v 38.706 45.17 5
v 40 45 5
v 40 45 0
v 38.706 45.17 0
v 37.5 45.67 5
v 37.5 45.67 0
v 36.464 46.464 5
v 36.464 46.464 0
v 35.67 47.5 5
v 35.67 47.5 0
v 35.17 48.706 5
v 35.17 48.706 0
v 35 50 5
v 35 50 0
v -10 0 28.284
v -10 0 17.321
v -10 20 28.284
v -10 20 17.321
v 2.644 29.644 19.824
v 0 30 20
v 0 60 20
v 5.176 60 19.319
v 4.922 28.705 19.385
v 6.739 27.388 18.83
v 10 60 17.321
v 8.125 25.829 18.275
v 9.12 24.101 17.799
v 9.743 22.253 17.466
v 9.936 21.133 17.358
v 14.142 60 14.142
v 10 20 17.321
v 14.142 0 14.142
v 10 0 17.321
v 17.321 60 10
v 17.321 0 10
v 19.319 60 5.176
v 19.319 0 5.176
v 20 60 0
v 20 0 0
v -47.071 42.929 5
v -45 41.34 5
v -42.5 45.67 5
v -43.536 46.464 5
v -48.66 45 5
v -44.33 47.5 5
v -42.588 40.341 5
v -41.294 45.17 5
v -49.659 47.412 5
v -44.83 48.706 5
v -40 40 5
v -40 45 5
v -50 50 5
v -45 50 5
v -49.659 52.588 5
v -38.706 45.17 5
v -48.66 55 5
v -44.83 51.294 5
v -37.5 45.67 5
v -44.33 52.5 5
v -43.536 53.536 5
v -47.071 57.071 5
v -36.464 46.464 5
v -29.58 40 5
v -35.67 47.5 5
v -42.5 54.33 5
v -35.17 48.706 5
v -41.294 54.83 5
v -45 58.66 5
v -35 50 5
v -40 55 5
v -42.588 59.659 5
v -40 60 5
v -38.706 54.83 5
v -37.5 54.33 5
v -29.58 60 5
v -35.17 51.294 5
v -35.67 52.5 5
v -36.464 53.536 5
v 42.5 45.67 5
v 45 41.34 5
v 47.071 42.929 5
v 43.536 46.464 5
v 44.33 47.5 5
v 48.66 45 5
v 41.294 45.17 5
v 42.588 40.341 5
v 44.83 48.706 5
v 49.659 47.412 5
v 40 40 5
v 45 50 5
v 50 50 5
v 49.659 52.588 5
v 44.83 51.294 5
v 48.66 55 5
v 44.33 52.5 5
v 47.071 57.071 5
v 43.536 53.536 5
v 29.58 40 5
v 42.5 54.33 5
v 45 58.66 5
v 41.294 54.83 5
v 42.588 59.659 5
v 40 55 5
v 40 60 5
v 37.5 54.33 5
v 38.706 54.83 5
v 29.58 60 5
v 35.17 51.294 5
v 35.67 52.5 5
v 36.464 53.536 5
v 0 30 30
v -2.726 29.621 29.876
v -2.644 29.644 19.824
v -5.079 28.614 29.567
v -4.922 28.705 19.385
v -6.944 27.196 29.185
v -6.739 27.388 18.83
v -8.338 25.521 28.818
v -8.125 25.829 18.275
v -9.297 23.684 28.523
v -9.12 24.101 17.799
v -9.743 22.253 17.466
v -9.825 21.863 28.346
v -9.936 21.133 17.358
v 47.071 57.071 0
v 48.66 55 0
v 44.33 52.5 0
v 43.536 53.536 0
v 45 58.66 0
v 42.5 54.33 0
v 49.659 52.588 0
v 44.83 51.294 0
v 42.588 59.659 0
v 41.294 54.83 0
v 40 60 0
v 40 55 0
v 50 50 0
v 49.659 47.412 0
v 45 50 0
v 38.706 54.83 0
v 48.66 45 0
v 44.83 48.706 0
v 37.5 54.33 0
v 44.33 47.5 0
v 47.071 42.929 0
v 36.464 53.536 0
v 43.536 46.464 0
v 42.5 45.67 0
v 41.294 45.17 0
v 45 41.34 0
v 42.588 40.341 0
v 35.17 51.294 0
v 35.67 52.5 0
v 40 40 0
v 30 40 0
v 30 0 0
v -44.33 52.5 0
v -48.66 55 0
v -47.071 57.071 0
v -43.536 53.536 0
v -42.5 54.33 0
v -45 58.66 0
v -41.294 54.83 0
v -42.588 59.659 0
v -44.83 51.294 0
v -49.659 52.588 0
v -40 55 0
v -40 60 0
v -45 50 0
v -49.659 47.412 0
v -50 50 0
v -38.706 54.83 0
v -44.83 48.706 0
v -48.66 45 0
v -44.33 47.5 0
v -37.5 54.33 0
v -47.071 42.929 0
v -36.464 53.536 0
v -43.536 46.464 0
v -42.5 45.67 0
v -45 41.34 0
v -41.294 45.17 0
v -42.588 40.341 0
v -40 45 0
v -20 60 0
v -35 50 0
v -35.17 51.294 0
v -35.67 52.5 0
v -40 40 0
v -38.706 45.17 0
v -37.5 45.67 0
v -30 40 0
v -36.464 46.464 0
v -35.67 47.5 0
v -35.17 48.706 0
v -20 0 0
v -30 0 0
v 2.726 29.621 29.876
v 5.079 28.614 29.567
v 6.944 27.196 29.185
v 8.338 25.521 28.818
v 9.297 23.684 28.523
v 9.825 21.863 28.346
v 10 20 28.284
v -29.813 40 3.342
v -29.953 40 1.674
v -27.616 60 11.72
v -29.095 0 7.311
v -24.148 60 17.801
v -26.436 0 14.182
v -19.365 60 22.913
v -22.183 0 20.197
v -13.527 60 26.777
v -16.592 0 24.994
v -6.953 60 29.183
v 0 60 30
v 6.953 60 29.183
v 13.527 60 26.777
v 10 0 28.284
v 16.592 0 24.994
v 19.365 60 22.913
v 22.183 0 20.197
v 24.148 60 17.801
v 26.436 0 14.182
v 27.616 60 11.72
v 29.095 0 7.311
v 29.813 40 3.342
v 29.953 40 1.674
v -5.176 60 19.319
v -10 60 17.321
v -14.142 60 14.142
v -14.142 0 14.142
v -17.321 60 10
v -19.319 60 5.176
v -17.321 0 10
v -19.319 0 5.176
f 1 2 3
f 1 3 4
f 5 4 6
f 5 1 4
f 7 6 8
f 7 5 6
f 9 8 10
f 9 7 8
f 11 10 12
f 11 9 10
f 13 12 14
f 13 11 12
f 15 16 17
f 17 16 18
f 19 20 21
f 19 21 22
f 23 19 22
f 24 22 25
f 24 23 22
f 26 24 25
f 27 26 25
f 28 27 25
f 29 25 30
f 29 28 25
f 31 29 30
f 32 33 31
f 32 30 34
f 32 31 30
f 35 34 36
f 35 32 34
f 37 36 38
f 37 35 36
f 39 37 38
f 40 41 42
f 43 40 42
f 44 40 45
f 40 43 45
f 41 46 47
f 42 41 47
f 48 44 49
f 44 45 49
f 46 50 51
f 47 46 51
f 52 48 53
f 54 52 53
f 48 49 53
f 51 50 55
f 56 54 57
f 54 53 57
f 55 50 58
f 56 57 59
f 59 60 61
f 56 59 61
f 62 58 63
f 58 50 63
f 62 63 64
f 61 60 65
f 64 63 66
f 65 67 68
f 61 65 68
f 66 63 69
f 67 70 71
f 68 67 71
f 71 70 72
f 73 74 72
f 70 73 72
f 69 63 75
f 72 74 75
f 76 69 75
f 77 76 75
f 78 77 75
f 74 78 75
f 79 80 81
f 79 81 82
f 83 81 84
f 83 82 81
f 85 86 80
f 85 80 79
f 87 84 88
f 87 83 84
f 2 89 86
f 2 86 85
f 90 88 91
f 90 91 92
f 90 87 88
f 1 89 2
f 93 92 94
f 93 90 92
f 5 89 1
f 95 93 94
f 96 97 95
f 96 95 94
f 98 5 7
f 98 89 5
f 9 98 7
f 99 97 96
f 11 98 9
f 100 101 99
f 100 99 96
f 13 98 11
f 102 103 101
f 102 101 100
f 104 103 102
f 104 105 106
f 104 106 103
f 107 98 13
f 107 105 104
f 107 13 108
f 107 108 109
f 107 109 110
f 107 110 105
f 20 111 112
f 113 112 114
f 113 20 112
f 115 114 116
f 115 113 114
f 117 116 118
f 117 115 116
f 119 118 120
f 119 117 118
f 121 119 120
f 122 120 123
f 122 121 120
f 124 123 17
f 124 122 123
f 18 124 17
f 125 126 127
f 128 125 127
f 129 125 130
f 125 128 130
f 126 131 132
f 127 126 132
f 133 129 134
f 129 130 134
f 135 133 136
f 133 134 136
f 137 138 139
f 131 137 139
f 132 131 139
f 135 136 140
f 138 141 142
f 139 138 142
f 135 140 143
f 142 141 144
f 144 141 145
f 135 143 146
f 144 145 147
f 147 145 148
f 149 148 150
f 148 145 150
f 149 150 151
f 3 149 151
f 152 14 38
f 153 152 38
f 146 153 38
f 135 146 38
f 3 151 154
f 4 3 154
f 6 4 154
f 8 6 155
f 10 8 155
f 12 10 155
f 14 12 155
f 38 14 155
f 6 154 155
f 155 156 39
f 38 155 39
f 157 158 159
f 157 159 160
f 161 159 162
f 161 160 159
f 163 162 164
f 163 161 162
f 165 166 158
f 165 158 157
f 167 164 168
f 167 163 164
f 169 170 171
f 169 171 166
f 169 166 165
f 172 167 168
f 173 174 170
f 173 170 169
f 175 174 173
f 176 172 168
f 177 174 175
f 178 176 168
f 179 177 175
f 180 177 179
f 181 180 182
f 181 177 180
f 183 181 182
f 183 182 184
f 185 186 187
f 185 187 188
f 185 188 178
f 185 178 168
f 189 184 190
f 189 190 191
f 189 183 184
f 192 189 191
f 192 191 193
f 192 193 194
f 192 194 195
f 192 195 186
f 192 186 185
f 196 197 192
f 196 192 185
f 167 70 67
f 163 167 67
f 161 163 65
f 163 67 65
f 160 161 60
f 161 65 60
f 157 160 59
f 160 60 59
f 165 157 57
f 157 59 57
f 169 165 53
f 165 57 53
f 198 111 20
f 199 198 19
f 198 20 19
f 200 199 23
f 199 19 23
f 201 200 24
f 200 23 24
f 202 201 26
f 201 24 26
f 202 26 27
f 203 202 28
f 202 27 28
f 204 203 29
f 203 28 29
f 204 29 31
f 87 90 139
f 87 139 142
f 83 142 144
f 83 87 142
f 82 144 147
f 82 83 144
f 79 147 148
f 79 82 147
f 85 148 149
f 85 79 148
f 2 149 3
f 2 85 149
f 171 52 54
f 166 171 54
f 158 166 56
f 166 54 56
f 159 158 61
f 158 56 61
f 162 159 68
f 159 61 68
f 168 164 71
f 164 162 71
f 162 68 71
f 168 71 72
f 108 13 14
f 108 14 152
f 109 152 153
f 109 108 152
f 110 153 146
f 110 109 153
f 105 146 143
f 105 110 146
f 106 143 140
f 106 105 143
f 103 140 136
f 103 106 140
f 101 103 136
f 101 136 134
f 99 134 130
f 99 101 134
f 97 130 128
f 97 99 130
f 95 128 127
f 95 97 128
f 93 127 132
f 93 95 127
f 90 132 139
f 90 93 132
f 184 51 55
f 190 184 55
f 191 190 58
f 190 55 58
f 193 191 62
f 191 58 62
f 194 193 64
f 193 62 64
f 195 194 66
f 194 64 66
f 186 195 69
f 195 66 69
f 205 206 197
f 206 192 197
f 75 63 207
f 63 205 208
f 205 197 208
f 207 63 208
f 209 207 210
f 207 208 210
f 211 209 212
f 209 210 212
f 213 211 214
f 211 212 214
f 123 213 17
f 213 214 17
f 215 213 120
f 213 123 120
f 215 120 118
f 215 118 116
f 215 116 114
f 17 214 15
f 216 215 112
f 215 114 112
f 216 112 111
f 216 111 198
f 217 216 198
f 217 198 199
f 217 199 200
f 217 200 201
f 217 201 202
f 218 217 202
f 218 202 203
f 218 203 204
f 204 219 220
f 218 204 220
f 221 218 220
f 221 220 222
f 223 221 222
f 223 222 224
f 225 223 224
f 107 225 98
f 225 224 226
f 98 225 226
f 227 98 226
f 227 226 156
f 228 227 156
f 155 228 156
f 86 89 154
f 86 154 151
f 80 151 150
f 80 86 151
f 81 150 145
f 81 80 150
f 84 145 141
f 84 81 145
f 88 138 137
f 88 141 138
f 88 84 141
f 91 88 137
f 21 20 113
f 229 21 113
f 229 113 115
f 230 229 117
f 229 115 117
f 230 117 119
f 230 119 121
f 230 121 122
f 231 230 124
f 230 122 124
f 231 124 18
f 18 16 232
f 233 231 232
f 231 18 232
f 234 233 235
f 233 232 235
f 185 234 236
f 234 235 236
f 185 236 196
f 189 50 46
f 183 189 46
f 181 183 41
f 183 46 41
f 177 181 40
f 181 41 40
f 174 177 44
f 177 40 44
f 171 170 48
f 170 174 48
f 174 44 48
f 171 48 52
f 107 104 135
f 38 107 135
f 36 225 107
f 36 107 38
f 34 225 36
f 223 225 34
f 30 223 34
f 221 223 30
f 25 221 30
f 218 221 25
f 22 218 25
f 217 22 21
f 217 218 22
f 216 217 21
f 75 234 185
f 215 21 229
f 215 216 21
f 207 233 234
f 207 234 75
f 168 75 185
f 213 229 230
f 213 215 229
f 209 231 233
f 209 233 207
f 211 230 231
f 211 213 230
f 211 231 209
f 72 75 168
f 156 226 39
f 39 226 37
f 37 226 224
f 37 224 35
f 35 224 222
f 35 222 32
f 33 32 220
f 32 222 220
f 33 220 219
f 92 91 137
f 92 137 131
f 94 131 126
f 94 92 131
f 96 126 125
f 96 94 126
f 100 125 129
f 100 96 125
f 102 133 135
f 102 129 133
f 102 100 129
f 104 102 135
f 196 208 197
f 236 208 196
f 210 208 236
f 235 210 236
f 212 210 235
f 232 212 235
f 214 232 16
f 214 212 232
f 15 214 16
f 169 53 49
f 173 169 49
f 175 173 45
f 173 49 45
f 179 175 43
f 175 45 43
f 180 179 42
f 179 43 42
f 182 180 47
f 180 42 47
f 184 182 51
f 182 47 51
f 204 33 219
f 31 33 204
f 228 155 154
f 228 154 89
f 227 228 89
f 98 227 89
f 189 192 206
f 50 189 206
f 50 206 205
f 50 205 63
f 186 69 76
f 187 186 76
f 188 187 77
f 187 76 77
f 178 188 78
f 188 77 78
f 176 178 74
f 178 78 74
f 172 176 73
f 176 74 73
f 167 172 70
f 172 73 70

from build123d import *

# Parameters (mm, degrees)
F1_DEPTH = 60
F2_W     = 20
F2_H     = 5
F3_DEPTH = 50
F5_DEPTH = 60.001
F6_W     = 10
F6_H     = 20
F7_DEPTH = 30.001
F8_DEPTH = 5.0010001


with BuildPart() as f1:
    # F0 (on Front) → F1 (new body)
    with BuildSketch(Plane.XZ):
        with BuildLine():
            ThreePointArc((0, 20), (-14.1421356237, 14.1421356237), (-20, 0))
            Line((-20, 0), (0, 0))
            Line((0, 0), (0, 20))
        make_face()
        with BuildLine():
            ThreePointArc((0, 30), (-21.2132034356, 21.2132034356), (-30, 0))
            Line((-30, 0), (-20, 0))
            ThreePointArc((-20, 0), (-14.1421356237, 14.1421356237), (0, 20))
            Line((0, 20), (0, 30))
        make_face()
    extrude(amount=-F1_DEPTH)

    # F2 (on face) → F3 (join)
    with BuildSketch(Plane.YZ):
        with Locations((50, 2.5)):
            Rectangle(F2_W, F2_H)
    extrude(amount=-F3_DEPTH)

    # F0 (on Front) → F5 (cut, through all)
    with BuildSketch(Plane.XZ):
        with BuildLine():
            ThreePointArc((0, 20), (-14.1421356237, 14.1421356237), (-20, 0))
            Line((-20, 0), (0, 0))
            Line((0, 0), (0, 20))
        make_face()
    extrude(amount=-F5_DEPTH, mode=Mode.SUBTRACT)

    # F6 (on Top) → F7 (cut, through all)
    with BuildSketch(Plane.XY):
        with Locations((-5, 10)):
            Rectangle(F6_W, F6_H)
        with BuildLine():
            Line((-10, 20), (0, 20))
            Line((0, 20), (0, 30))
            ThreePointArc((0, 30), (-7.0710678119, 27.0710678119), (-10, 20))
        make_face()
    extrude(amount=F7_DEPTH, mode=Mode.SUBTRACT)

    # F4 (on face) → F8 (cut, through all)
    with BuildSketch(Plane.XY.offset(5)):
        with BuildLine():
            ThreePointArc((-40, 40), (-47.0710678119, 42.9289321881), (-50, 50))
            Line((-50, 50), (-50, 40))
            Line((-50, 40), (-40, 40))
        make_face()
        with BuildLine():
            Line((-40, 60), (-50, 60))
            Line((-50, 60), (-50, 50))
            ThreePointArc((-50, 50), (-47.0710678119, 57.0710678119), (-40, 60))
        make_face()
        with BuildLine():
            Line((-40, 50), (-45, 50))
            ThreePointArc((-45, 50), (-43.5355339059, 46.4644660941), (-40, 45))
            Line((-40, 45), (-40, 50))
        make_face()
        with BuildLine():
            Line((-35, 50), (-40, 50))
            Line((-40, 50), (-40, 45))
            ThreePointArc((-40, 45), (-36.4644660941, 46.4644660941), (-35, 50))
        make_face()
        with BuildLine():
            ThreePointArc((-35, 50), (-36.4644660941, 53.5355339059), (-40, 55))
            Line((-40, 55), (-40, 50))
            Line((-40, 50), (-35, 50))
        make_face()
        with BuildLine():
            ThreePointArc((-40, 55), (-43.5355339059, 53.5355339059), (-45, 50))
            Line((-45, 50), (-40, 50))
            Line((-40, 50), (-40, 55))
        make_face()
    extrude(amount=-F8_DEPTH, mode=Mode.SUBTRACT)

    # F9: F1 across plane


with BuildPart() as f1_1:
    add(f1.part)
    add(f1.part.mirror(Plane.YZ))


solid = f1_1.part
